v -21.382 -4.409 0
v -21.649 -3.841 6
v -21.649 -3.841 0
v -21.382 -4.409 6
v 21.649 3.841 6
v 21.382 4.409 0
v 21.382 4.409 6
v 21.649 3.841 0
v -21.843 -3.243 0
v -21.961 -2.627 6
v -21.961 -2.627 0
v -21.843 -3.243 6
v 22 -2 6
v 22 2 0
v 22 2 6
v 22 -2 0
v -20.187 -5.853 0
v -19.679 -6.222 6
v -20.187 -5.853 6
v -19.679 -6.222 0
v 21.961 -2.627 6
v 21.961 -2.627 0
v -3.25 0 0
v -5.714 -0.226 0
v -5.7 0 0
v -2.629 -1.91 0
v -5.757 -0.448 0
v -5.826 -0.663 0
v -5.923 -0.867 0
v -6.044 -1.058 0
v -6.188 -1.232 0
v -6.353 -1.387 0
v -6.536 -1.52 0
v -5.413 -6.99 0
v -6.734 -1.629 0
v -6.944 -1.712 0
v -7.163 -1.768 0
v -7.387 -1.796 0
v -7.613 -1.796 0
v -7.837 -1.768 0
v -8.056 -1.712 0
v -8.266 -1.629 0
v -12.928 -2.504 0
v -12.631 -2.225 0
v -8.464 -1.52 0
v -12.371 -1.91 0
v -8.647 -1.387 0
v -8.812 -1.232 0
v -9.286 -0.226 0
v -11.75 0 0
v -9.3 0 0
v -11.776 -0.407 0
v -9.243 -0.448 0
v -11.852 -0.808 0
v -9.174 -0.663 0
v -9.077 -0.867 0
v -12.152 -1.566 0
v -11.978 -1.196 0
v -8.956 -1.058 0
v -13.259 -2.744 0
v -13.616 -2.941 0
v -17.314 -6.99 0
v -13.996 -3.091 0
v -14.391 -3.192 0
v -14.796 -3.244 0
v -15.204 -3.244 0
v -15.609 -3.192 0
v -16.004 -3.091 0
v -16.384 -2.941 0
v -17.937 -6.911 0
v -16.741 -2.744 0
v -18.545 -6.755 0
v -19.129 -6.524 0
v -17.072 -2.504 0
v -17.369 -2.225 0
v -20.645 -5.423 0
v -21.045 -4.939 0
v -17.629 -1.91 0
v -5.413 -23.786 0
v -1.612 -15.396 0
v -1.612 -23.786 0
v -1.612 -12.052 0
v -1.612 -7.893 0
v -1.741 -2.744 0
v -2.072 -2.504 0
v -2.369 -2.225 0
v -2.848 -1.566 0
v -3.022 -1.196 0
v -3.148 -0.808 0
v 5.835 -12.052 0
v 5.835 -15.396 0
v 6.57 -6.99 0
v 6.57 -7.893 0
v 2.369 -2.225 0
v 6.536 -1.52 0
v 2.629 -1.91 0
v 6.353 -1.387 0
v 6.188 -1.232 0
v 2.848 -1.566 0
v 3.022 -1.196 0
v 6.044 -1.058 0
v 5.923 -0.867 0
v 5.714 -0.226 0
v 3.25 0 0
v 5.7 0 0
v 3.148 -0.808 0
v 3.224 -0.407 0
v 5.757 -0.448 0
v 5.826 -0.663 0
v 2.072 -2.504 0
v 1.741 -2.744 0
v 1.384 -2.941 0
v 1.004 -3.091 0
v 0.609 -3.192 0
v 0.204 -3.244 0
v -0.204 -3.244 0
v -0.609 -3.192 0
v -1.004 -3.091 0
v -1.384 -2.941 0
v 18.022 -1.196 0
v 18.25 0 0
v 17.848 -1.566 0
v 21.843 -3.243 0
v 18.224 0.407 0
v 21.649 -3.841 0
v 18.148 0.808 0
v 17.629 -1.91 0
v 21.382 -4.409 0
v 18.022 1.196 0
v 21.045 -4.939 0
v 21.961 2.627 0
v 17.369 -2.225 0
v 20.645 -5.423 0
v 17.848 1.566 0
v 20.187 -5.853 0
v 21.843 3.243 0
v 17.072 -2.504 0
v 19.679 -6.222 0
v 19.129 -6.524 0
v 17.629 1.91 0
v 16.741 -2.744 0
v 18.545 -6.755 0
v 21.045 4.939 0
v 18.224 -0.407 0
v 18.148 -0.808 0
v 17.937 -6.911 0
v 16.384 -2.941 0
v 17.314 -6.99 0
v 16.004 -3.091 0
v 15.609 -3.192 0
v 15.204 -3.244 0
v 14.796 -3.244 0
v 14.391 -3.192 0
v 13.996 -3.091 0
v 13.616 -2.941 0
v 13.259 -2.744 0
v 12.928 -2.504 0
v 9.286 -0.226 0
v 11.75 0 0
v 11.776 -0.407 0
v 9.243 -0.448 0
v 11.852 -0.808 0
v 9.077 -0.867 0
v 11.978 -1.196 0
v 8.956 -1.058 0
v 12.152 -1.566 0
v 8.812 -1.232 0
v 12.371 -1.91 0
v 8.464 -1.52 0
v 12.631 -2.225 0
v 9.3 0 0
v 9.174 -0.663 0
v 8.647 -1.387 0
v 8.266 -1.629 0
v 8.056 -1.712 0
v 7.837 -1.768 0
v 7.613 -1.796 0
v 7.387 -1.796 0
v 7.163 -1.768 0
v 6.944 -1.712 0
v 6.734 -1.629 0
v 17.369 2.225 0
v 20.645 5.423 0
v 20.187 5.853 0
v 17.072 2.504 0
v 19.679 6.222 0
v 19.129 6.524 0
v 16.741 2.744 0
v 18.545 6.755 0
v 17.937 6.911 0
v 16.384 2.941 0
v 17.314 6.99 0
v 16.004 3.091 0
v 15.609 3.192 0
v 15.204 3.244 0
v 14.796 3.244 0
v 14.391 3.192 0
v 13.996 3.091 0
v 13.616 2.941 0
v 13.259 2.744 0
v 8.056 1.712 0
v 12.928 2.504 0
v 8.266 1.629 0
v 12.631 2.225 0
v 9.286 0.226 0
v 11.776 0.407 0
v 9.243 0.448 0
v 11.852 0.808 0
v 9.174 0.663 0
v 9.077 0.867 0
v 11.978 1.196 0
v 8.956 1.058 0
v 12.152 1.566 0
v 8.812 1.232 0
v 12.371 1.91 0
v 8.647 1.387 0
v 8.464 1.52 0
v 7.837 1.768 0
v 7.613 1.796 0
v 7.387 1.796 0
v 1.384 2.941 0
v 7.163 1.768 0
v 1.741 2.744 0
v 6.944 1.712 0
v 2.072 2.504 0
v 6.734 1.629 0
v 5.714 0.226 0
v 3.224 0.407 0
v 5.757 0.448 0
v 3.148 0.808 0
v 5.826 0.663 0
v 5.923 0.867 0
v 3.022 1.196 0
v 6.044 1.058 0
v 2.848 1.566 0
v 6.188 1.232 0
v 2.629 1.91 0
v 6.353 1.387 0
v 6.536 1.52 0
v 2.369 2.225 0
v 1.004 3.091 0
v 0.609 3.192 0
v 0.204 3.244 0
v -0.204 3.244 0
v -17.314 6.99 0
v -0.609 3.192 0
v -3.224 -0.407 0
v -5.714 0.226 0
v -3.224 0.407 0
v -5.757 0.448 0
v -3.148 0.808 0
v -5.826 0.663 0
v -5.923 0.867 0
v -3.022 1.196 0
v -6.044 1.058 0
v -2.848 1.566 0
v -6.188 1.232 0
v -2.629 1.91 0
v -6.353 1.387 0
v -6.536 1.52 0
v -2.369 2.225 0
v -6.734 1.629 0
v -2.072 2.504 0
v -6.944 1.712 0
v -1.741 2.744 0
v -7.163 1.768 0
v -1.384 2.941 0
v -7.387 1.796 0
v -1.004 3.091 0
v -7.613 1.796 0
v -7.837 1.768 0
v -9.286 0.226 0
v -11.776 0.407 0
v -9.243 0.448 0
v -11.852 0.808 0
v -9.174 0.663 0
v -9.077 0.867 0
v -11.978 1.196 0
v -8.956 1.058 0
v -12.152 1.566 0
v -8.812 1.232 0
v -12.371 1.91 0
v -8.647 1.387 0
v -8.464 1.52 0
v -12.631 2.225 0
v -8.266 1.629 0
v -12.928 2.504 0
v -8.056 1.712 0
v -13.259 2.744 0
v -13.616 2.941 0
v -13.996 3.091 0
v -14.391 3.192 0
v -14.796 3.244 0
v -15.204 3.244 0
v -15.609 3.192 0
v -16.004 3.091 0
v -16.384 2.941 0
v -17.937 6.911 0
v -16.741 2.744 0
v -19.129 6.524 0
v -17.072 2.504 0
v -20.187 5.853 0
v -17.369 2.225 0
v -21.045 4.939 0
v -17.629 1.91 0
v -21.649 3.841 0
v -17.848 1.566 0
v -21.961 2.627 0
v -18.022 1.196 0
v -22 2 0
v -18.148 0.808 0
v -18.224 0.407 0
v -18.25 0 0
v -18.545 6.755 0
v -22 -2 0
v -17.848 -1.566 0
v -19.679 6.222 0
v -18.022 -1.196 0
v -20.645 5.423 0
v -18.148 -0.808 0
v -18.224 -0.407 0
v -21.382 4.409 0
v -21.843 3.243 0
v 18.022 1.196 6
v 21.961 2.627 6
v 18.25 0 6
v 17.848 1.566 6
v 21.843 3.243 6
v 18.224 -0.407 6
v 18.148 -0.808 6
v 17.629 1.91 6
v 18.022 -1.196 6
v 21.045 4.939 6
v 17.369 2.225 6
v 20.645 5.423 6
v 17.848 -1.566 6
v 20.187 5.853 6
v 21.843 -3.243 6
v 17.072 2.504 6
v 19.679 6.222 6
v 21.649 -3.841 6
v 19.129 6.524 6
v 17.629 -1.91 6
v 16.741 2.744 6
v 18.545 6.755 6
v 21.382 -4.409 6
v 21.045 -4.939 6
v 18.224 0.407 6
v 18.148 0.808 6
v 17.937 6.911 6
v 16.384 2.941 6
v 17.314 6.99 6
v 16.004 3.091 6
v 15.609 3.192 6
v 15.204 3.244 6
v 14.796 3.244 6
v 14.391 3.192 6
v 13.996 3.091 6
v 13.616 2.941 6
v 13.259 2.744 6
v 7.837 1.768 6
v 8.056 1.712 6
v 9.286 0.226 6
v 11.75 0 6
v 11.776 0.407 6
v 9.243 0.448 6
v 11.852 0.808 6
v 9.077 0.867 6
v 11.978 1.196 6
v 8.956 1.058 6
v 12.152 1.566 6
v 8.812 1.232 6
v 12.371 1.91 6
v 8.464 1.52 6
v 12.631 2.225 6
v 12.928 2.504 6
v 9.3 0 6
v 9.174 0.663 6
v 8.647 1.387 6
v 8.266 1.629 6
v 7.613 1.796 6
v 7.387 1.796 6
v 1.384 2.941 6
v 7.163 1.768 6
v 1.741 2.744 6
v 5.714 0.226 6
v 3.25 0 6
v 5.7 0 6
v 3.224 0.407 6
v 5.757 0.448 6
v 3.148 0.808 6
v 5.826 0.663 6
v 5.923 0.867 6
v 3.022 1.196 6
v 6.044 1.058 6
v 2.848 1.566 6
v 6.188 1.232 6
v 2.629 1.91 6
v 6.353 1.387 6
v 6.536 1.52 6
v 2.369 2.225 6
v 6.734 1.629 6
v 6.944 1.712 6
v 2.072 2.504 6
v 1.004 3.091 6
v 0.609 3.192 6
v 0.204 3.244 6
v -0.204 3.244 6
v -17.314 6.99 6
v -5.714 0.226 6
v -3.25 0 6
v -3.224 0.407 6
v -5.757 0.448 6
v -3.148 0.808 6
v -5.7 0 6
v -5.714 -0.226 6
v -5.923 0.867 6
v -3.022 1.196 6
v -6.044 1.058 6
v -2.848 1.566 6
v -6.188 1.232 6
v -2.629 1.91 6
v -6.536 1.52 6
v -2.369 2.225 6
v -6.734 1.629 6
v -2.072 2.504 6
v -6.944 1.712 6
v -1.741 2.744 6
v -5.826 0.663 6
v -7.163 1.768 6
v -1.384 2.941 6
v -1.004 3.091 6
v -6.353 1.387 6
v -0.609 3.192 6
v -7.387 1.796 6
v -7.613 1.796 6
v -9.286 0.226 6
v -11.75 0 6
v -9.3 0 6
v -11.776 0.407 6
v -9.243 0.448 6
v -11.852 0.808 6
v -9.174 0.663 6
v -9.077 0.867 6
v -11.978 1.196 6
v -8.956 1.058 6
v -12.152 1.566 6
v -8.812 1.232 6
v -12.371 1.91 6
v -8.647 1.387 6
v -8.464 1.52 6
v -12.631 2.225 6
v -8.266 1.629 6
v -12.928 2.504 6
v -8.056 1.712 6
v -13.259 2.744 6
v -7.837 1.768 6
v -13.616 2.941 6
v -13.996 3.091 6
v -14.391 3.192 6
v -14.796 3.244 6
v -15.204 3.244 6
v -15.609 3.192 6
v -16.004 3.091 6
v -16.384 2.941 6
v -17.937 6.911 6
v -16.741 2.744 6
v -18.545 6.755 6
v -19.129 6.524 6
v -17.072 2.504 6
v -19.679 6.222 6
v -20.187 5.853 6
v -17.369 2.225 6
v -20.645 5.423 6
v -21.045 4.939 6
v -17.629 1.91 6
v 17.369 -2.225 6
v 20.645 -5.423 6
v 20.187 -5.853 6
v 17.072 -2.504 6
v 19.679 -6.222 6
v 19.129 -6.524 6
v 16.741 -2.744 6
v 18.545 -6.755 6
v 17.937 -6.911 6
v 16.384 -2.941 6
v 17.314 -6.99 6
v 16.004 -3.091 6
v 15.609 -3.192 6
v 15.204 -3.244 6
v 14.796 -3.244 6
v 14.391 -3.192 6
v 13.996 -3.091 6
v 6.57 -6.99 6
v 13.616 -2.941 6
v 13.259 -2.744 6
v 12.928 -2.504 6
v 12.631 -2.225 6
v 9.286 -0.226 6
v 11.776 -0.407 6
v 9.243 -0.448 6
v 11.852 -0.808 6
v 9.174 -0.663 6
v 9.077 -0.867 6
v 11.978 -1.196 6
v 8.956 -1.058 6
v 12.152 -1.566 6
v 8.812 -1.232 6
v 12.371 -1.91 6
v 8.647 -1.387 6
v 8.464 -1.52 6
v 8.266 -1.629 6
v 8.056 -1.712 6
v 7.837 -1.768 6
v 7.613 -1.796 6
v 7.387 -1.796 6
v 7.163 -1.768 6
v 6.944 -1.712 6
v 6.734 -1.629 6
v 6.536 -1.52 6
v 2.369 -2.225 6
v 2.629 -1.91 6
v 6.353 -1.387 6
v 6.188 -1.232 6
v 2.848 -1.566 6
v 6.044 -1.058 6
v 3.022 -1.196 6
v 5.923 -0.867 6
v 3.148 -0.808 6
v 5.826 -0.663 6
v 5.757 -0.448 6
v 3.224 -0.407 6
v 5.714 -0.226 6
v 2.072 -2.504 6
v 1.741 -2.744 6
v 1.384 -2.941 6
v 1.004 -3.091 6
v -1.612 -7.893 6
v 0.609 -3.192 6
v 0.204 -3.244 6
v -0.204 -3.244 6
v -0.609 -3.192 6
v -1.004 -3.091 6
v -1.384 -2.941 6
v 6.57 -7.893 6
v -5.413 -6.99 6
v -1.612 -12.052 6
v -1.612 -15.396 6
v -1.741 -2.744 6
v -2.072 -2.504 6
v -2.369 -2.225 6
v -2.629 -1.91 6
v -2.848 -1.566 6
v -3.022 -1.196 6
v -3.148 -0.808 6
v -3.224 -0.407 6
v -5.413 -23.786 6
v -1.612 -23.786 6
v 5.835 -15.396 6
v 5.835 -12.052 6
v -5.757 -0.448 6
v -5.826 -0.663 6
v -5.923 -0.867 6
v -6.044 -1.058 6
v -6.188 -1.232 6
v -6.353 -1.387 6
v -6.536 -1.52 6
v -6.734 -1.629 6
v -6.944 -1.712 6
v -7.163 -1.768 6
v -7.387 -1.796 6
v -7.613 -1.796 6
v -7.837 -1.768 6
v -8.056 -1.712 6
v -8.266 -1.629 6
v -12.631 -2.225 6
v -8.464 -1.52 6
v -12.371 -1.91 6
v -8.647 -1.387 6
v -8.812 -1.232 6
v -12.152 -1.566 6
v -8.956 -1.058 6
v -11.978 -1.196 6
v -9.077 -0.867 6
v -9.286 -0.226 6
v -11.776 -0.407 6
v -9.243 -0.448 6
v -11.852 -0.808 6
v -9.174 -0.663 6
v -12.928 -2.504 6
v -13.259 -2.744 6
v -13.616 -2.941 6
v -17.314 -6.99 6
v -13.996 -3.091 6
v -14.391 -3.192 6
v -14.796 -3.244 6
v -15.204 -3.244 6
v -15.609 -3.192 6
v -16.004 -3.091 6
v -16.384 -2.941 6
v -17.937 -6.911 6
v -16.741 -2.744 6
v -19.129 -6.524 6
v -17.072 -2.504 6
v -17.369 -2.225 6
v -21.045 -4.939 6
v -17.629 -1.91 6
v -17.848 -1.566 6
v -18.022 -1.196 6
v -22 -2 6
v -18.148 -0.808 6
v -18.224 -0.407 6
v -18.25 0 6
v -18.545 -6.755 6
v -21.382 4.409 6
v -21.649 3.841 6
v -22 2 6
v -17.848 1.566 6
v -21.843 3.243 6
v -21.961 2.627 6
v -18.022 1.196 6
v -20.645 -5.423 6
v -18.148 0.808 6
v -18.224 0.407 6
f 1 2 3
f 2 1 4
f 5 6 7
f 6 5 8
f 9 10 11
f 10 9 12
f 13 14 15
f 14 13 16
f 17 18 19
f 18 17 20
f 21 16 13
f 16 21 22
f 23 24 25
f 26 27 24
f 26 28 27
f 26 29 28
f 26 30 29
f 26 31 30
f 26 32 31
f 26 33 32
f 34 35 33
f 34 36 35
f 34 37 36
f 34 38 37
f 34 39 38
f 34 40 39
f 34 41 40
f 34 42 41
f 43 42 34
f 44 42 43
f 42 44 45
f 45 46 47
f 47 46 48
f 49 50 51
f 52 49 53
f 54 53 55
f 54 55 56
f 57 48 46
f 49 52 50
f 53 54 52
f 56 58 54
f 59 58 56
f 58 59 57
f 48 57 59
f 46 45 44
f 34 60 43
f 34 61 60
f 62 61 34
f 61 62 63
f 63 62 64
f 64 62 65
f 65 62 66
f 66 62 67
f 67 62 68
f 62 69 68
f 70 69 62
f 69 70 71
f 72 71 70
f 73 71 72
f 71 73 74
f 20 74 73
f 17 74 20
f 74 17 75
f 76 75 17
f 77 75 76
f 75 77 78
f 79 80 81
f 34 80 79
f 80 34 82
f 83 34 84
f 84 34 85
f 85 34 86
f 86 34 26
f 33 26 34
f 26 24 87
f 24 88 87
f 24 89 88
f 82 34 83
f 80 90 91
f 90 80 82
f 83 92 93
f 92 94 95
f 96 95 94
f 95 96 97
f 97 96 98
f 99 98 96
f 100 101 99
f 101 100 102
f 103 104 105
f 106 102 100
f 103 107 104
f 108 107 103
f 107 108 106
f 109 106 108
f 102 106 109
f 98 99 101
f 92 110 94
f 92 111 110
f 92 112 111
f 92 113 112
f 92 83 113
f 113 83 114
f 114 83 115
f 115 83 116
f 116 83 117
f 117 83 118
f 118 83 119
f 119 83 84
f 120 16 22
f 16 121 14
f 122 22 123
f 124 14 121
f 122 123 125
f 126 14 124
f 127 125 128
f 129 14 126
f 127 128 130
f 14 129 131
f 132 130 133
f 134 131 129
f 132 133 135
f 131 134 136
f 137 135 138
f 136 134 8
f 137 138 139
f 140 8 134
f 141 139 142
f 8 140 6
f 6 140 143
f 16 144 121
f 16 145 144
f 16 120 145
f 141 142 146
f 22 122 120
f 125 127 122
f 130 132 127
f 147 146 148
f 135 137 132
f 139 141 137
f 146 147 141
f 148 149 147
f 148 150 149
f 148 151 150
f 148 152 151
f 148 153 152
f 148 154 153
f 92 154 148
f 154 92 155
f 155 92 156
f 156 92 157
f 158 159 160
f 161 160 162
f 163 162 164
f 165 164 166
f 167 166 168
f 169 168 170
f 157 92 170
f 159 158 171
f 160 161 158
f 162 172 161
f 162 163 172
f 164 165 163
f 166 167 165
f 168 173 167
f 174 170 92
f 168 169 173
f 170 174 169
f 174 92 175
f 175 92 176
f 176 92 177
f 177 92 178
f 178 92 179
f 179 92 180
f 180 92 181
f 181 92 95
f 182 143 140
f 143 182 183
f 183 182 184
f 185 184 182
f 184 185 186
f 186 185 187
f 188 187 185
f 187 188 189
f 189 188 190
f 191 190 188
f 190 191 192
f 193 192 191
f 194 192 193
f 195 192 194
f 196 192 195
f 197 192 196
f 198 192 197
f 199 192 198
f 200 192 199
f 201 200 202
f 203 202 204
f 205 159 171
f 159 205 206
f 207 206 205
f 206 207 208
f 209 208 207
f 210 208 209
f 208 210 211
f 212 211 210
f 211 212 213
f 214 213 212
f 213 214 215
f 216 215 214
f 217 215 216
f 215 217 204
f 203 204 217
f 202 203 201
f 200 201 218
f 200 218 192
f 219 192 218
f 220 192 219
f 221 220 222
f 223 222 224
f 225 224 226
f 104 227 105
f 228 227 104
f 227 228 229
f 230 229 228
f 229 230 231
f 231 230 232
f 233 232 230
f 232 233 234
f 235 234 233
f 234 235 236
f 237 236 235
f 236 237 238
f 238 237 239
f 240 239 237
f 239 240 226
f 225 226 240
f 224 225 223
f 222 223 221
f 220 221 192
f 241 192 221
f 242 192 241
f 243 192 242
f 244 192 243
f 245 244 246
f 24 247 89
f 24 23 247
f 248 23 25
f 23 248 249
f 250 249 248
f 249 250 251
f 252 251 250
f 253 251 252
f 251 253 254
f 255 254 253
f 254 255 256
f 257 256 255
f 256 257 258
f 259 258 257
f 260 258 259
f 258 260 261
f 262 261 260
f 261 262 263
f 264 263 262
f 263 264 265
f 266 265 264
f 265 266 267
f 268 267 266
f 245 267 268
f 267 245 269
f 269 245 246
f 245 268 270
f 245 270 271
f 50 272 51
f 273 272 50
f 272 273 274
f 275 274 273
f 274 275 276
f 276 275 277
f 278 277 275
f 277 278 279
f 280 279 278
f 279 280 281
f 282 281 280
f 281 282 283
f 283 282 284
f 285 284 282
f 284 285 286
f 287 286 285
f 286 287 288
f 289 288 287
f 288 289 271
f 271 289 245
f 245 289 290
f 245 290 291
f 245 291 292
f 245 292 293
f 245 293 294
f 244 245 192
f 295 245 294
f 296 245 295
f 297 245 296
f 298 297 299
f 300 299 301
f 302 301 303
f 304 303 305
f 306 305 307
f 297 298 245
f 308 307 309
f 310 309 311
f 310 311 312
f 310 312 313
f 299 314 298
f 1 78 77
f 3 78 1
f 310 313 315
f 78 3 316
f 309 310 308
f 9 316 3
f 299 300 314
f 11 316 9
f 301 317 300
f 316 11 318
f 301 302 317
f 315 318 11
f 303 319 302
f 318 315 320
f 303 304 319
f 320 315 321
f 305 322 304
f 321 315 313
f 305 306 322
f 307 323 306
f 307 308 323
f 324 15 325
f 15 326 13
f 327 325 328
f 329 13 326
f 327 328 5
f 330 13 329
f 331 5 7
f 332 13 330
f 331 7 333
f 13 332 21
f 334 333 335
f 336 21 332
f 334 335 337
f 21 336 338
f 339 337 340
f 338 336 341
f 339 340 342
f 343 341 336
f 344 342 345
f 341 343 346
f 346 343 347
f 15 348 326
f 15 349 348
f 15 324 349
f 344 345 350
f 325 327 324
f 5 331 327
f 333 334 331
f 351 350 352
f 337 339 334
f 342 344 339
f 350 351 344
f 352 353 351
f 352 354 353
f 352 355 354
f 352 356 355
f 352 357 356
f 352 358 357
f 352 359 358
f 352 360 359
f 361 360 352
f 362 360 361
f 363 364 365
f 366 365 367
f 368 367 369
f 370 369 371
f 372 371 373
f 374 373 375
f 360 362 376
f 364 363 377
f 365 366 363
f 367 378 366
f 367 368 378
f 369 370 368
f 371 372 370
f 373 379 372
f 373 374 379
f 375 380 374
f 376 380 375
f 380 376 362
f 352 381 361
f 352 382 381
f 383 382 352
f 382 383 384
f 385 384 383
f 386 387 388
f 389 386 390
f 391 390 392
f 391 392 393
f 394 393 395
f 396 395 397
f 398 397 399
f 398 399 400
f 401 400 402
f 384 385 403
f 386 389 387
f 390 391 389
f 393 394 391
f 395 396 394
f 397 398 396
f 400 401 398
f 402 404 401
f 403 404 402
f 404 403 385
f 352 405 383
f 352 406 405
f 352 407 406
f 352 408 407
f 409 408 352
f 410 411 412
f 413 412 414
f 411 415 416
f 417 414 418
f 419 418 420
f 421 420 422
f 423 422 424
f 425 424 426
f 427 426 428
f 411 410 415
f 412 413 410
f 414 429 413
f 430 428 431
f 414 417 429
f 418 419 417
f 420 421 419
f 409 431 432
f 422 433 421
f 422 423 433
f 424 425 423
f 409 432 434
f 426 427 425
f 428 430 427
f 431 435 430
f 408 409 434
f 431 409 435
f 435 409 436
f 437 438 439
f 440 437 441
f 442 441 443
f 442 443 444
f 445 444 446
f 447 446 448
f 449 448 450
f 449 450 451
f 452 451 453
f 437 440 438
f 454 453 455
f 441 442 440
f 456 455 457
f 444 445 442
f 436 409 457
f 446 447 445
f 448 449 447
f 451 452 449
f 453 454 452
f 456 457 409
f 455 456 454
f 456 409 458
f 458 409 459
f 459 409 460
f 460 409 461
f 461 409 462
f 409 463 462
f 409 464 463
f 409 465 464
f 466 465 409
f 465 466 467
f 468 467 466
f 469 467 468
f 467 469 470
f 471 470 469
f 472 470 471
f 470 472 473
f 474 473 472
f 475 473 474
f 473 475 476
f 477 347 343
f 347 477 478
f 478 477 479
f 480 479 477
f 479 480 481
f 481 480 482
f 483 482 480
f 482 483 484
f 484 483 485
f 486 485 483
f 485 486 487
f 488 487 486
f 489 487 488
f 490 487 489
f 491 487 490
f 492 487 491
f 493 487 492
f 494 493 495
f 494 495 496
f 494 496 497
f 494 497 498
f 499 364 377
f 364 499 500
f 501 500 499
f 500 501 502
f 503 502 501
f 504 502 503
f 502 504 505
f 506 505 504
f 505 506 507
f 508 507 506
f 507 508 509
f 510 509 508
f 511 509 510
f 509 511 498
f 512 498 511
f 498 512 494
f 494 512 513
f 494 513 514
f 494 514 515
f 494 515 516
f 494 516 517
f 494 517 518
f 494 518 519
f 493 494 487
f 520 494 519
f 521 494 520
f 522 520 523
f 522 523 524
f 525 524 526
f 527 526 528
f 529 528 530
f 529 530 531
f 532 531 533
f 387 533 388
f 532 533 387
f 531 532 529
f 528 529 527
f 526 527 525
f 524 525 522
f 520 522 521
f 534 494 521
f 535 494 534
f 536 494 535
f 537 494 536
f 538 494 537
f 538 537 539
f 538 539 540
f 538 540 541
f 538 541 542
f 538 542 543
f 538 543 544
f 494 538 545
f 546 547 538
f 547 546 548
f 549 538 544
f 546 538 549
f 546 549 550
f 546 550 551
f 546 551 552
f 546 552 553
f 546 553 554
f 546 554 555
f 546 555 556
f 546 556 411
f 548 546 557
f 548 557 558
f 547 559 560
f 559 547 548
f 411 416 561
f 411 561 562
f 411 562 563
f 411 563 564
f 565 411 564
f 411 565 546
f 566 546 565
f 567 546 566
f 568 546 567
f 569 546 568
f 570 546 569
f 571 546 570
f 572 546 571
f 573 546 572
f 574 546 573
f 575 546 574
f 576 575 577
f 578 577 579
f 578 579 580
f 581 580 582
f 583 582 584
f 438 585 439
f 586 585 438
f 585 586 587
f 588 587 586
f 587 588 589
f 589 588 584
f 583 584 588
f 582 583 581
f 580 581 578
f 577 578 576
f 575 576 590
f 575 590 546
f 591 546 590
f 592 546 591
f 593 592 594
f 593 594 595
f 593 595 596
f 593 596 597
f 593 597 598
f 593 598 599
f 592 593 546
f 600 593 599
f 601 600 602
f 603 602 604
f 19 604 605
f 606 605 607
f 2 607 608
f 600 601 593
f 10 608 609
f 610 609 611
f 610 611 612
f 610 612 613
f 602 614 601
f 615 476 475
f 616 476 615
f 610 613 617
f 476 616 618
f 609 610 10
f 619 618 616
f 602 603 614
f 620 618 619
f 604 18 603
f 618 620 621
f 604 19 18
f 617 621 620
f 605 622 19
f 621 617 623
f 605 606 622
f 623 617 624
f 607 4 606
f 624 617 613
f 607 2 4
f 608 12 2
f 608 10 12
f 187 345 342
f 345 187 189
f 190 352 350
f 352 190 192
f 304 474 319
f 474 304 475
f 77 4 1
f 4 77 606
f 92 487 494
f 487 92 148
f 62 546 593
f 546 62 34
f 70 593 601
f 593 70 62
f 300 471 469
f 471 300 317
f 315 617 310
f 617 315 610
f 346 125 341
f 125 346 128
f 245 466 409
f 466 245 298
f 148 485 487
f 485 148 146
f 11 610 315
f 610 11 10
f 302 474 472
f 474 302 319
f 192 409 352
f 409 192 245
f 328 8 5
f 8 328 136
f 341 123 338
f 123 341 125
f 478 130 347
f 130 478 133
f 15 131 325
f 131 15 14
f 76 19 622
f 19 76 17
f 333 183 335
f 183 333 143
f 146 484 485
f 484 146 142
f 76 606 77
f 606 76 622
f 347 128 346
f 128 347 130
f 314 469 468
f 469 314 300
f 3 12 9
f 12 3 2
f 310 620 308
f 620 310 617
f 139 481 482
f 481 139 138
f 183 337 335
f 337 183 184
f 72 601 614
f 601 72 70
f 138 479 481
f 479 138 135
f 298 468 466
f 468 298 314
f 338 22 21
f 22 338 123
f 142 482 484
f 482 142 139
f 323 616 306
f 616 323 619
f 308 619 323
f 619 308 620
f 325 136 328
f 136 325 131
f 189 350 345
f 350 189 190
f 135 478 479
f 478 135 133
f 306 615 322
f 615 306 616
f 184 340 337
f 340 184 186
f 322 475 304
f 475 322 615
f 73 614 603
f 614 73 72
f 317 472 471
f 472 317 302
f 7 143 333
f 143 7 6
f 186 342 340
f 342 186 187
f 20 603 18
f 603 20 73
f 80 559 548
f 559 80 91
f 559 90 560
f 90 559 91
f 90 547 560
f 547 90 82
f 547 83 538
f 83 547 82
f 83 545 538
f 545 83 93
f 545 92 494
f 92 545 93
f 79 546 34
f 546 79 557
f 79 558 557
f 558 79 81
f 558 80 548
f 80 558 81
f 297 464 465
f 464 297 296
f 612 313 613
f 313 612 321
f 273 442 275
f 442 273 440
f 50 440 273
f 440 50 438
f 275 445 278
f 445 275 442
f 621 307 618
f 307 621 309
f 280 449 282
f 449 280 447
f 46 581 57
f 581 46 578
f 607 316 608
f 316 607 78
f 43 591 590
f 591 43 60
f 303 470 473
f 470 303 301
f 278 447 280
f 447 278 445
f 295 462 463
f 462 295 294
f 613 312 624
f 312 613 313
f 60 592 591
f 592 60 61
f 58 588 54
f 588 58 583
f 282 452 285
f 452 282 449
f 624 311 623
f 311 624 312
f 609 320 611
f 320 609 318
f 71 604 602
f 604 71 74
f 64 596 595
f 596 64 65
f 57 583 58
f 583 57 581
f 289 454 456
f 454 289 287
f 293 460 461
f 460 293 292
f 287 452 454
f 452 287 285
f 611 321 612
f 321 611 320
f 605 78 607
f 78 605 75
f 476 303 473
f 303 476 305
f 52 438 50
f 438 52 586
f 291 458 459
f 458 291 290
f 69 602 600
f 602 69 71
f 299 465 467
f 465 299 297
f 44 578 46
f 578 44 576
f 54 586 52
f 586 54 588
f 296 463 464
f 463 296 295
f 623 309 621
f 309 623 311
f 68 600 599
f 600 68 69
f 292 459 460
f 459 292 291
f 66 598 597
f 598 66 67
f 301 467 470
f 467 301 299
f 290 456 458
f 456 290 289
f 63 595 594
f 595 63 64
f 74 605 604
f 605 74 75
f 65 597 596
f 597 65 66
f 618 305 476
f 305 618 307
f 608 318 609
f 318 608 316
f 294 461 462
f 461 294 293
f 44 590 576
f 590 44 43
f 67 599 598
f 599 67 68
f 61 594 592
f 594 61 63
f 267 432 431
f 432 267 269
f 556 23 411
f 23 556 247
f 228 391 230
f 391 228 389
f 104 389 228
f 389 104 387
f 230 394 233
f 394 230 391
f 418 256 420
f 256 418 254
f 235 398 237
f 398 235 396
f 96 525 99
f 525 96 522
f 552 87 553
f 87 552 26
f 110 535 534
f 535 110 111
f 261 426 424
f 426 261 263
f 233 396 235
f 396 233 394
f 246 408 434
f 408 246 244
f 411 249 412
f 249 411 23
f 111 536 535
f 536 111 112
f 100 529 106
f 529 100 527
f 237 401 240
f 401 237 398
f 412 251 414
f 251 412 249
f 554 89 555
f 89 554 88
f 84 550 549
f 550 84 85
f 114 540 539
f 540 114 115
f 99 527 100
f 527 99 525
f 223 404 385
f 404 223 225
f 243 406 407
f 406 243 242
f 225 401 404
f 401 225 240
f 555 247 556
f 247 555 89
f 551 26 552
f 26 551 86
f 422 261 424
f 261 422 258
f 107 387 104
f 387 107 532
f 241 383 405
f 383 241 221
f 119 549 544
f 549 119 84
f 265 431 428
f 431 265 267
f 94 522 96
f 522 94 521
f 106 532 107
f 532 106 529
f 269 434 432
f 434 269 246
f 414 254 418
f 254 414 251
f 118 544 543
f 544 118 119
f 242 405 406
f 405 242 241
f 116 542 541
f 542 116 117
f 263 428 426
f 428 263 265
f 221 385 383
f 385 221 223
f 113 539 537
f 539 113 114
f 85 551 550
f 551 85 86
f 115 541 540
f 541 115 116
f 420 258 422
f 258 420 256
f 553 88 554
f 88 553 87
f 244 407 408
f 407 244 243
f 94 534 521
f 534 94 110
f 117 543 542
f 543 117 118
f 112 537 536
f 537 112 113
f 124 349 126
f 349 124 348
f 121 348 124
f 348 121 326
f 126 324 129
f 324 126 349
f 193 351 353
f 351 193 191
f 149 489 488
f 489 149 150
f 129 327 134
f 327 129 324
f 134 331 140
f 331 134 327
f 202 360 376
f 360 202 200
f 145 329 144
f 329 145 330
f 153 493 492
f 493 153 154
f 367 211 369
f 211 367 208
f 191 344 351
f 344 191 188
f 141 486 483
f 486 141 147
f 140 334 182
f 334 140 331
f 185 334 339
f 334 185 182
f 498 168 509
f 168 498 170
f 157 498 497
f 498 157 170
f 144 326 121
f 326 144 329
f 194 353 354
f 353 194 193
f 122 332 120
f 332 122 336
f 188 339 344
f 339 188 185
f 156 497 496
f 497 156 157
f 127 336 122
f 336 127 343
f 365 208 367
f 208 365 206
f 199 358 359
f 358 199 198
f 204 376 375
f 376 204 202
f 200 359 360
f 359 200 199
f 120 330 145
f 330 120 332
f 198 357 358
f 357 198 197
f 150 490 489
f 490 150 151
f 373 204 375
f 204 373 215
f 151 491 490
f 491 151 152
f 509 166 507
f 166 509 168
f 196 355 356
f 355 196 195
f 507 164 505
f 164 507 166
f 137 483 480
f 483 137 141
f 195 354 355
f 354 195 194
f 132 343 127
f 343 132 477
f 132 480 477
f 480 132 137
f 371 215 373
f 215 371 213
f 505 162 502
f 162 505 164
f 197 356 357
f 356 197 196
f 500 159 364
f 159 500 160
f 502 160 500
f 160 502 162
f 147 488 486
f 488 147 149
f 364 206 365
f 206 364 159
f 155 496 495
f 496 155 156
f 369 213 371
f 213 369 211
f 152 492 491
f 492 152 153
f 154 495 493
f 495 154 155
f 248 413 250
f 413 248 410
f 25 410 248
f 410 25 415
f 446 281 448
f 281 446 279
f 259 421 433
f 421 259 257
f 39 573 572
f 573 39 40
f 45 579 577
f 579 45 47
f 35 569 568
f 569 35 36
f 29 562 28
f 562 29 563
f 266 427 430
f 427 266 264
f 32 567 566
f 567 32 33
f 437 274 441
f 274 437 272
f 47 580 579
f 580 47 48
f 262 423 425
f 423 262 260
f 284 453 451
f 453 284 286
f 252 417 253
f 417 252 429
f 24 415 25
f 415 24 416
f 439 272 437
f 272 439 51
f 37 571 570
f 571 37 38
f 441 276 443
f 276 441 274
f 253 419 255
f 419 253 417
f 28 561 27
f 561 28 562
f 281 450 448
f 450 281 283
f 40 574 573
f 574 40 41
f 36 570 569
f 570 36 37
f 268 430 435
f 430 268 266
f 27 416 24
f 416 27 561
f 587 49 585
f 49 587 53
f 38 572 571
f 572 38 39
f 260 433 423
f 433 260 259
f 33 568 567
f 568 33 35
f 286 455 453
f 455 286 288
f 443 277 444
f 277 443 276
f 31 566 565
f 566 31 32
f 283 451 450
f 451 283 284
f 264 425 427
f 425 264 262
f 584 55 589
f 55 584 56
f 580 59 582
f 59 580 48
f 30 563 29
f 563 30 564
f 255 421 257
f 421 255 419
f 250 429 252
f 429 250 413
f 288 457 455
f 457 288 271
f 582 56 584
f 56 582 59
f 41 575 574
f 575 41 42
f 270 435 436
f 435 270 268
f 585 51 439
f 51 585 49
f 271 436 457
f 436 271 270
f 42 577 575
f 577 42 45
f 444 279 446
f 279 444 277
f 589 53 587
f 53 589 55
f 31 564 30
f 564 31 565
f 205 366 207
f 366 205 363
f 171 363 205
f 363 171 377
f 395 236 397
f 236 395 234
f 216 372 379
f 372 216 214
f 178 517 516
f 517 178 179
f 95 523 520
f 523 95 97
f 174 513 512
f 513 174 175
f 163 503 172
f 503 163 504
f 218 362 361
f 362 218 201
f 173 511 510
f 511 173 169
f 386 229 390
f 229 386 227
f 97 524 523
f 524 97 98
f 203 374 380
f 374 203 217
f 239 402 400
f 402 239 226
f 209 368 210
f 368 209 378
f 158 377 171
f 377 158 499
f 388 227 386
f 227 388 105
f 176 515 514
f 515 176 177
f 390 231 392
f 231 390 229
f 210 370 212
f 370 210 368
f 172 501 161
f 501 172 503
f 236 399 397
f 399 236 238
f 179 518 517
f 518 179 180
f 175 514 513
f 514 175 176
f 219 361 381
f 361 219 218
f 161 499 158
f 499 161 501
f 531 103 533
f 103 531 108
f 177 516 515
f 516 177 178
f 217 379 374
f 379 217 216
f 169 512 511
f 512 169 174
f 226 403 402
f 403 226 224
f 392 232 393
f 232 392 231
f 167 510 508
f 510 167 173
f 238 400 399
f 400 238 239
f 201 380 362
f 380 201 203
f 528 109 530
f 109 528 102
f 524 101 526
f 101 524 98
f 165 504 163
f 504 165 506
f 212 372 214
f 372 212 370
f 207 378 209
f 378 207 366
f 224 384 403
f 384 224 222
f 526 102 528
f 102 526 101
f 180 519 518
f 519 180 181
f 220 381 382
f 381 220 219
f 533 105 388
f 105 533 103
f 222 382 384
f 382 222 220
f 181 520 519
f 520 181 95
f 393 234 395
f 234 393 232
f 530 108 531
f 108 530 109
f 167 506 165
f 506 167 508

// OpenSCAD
$fn = 50;


difference() {
	union() {
		hull() {
			translate(v = [-17.0000000000, 2.0000000000, 0]) {
				cylinder(h = 6, r = 5);
			}
			translate(v = [17.0000000000, 2.0000000000, 0]) {
				cylinder(h = 6, r = 5);
			}
			translate(v = [-17.0000000000, -2.0000000000, 0]) {
				cylinder(h = 6, r = 5);
			}
			translate(v = [17.0000000000, -2.0000000000, 0]) {
				cylinder(h = 6, r = 5);
			}
		}
		translate(v = [0, -5, 0]) {
			linear_extrude(height = 6) {
				text(font = "DejaVu Sans Mono:style=Bold", halign = "center", size = 19.0000000000, text = "F", valign = "top");
			}
		}
	}
	union() {
		translate(v = [-15.0000000000, 0.0000000000, 0]) {
			translate(v = [0, 0, -100]) {
				cylinder(h = 200, r = 3.2500000000);
			}
		}
		translate(v = [0, 0, -100]) {
			cylinder(h = 200, r = 3.2500000000);
		}
		translate(v = [15.0000000000, 0.0000000000, 0]) {
			translate(v = [0, 0, -100]) {
				cylinder(h = 200, r = 3.2500000000);
			}
		}
		translate(v = [-15.0000000000, 0.0000000000, 0]) {
			translate(v = [0, 0, -100]) {
				cylinder(h = 200, r = 1.8000000000);
			}
		}
		translate(v = [-7.5000000000, 0.0000000000, 0]) {
			translate(v = [0, 0, -100]) {
				cylinder(h = 200, r = 1.8000000000);
			}
		}
		translate(v = [0, 0, -100]) {
			cylinder(h = 200, r = 1.8000000000);
		}
		translate(v = [7.5000000000, 0.0000000000, 0]) {
			translate(v = [0, 0, -100]) {
				cylinder(h = 200, r = 1.8000000000);
			}
		}
		translate(v = [15.0000000000, 0.0000000000, 0]) {
			translate(v = [0, 0, -100]) {
				cylinder(h = 200, r = 1.8000000000);
			}
		}
	}
}
